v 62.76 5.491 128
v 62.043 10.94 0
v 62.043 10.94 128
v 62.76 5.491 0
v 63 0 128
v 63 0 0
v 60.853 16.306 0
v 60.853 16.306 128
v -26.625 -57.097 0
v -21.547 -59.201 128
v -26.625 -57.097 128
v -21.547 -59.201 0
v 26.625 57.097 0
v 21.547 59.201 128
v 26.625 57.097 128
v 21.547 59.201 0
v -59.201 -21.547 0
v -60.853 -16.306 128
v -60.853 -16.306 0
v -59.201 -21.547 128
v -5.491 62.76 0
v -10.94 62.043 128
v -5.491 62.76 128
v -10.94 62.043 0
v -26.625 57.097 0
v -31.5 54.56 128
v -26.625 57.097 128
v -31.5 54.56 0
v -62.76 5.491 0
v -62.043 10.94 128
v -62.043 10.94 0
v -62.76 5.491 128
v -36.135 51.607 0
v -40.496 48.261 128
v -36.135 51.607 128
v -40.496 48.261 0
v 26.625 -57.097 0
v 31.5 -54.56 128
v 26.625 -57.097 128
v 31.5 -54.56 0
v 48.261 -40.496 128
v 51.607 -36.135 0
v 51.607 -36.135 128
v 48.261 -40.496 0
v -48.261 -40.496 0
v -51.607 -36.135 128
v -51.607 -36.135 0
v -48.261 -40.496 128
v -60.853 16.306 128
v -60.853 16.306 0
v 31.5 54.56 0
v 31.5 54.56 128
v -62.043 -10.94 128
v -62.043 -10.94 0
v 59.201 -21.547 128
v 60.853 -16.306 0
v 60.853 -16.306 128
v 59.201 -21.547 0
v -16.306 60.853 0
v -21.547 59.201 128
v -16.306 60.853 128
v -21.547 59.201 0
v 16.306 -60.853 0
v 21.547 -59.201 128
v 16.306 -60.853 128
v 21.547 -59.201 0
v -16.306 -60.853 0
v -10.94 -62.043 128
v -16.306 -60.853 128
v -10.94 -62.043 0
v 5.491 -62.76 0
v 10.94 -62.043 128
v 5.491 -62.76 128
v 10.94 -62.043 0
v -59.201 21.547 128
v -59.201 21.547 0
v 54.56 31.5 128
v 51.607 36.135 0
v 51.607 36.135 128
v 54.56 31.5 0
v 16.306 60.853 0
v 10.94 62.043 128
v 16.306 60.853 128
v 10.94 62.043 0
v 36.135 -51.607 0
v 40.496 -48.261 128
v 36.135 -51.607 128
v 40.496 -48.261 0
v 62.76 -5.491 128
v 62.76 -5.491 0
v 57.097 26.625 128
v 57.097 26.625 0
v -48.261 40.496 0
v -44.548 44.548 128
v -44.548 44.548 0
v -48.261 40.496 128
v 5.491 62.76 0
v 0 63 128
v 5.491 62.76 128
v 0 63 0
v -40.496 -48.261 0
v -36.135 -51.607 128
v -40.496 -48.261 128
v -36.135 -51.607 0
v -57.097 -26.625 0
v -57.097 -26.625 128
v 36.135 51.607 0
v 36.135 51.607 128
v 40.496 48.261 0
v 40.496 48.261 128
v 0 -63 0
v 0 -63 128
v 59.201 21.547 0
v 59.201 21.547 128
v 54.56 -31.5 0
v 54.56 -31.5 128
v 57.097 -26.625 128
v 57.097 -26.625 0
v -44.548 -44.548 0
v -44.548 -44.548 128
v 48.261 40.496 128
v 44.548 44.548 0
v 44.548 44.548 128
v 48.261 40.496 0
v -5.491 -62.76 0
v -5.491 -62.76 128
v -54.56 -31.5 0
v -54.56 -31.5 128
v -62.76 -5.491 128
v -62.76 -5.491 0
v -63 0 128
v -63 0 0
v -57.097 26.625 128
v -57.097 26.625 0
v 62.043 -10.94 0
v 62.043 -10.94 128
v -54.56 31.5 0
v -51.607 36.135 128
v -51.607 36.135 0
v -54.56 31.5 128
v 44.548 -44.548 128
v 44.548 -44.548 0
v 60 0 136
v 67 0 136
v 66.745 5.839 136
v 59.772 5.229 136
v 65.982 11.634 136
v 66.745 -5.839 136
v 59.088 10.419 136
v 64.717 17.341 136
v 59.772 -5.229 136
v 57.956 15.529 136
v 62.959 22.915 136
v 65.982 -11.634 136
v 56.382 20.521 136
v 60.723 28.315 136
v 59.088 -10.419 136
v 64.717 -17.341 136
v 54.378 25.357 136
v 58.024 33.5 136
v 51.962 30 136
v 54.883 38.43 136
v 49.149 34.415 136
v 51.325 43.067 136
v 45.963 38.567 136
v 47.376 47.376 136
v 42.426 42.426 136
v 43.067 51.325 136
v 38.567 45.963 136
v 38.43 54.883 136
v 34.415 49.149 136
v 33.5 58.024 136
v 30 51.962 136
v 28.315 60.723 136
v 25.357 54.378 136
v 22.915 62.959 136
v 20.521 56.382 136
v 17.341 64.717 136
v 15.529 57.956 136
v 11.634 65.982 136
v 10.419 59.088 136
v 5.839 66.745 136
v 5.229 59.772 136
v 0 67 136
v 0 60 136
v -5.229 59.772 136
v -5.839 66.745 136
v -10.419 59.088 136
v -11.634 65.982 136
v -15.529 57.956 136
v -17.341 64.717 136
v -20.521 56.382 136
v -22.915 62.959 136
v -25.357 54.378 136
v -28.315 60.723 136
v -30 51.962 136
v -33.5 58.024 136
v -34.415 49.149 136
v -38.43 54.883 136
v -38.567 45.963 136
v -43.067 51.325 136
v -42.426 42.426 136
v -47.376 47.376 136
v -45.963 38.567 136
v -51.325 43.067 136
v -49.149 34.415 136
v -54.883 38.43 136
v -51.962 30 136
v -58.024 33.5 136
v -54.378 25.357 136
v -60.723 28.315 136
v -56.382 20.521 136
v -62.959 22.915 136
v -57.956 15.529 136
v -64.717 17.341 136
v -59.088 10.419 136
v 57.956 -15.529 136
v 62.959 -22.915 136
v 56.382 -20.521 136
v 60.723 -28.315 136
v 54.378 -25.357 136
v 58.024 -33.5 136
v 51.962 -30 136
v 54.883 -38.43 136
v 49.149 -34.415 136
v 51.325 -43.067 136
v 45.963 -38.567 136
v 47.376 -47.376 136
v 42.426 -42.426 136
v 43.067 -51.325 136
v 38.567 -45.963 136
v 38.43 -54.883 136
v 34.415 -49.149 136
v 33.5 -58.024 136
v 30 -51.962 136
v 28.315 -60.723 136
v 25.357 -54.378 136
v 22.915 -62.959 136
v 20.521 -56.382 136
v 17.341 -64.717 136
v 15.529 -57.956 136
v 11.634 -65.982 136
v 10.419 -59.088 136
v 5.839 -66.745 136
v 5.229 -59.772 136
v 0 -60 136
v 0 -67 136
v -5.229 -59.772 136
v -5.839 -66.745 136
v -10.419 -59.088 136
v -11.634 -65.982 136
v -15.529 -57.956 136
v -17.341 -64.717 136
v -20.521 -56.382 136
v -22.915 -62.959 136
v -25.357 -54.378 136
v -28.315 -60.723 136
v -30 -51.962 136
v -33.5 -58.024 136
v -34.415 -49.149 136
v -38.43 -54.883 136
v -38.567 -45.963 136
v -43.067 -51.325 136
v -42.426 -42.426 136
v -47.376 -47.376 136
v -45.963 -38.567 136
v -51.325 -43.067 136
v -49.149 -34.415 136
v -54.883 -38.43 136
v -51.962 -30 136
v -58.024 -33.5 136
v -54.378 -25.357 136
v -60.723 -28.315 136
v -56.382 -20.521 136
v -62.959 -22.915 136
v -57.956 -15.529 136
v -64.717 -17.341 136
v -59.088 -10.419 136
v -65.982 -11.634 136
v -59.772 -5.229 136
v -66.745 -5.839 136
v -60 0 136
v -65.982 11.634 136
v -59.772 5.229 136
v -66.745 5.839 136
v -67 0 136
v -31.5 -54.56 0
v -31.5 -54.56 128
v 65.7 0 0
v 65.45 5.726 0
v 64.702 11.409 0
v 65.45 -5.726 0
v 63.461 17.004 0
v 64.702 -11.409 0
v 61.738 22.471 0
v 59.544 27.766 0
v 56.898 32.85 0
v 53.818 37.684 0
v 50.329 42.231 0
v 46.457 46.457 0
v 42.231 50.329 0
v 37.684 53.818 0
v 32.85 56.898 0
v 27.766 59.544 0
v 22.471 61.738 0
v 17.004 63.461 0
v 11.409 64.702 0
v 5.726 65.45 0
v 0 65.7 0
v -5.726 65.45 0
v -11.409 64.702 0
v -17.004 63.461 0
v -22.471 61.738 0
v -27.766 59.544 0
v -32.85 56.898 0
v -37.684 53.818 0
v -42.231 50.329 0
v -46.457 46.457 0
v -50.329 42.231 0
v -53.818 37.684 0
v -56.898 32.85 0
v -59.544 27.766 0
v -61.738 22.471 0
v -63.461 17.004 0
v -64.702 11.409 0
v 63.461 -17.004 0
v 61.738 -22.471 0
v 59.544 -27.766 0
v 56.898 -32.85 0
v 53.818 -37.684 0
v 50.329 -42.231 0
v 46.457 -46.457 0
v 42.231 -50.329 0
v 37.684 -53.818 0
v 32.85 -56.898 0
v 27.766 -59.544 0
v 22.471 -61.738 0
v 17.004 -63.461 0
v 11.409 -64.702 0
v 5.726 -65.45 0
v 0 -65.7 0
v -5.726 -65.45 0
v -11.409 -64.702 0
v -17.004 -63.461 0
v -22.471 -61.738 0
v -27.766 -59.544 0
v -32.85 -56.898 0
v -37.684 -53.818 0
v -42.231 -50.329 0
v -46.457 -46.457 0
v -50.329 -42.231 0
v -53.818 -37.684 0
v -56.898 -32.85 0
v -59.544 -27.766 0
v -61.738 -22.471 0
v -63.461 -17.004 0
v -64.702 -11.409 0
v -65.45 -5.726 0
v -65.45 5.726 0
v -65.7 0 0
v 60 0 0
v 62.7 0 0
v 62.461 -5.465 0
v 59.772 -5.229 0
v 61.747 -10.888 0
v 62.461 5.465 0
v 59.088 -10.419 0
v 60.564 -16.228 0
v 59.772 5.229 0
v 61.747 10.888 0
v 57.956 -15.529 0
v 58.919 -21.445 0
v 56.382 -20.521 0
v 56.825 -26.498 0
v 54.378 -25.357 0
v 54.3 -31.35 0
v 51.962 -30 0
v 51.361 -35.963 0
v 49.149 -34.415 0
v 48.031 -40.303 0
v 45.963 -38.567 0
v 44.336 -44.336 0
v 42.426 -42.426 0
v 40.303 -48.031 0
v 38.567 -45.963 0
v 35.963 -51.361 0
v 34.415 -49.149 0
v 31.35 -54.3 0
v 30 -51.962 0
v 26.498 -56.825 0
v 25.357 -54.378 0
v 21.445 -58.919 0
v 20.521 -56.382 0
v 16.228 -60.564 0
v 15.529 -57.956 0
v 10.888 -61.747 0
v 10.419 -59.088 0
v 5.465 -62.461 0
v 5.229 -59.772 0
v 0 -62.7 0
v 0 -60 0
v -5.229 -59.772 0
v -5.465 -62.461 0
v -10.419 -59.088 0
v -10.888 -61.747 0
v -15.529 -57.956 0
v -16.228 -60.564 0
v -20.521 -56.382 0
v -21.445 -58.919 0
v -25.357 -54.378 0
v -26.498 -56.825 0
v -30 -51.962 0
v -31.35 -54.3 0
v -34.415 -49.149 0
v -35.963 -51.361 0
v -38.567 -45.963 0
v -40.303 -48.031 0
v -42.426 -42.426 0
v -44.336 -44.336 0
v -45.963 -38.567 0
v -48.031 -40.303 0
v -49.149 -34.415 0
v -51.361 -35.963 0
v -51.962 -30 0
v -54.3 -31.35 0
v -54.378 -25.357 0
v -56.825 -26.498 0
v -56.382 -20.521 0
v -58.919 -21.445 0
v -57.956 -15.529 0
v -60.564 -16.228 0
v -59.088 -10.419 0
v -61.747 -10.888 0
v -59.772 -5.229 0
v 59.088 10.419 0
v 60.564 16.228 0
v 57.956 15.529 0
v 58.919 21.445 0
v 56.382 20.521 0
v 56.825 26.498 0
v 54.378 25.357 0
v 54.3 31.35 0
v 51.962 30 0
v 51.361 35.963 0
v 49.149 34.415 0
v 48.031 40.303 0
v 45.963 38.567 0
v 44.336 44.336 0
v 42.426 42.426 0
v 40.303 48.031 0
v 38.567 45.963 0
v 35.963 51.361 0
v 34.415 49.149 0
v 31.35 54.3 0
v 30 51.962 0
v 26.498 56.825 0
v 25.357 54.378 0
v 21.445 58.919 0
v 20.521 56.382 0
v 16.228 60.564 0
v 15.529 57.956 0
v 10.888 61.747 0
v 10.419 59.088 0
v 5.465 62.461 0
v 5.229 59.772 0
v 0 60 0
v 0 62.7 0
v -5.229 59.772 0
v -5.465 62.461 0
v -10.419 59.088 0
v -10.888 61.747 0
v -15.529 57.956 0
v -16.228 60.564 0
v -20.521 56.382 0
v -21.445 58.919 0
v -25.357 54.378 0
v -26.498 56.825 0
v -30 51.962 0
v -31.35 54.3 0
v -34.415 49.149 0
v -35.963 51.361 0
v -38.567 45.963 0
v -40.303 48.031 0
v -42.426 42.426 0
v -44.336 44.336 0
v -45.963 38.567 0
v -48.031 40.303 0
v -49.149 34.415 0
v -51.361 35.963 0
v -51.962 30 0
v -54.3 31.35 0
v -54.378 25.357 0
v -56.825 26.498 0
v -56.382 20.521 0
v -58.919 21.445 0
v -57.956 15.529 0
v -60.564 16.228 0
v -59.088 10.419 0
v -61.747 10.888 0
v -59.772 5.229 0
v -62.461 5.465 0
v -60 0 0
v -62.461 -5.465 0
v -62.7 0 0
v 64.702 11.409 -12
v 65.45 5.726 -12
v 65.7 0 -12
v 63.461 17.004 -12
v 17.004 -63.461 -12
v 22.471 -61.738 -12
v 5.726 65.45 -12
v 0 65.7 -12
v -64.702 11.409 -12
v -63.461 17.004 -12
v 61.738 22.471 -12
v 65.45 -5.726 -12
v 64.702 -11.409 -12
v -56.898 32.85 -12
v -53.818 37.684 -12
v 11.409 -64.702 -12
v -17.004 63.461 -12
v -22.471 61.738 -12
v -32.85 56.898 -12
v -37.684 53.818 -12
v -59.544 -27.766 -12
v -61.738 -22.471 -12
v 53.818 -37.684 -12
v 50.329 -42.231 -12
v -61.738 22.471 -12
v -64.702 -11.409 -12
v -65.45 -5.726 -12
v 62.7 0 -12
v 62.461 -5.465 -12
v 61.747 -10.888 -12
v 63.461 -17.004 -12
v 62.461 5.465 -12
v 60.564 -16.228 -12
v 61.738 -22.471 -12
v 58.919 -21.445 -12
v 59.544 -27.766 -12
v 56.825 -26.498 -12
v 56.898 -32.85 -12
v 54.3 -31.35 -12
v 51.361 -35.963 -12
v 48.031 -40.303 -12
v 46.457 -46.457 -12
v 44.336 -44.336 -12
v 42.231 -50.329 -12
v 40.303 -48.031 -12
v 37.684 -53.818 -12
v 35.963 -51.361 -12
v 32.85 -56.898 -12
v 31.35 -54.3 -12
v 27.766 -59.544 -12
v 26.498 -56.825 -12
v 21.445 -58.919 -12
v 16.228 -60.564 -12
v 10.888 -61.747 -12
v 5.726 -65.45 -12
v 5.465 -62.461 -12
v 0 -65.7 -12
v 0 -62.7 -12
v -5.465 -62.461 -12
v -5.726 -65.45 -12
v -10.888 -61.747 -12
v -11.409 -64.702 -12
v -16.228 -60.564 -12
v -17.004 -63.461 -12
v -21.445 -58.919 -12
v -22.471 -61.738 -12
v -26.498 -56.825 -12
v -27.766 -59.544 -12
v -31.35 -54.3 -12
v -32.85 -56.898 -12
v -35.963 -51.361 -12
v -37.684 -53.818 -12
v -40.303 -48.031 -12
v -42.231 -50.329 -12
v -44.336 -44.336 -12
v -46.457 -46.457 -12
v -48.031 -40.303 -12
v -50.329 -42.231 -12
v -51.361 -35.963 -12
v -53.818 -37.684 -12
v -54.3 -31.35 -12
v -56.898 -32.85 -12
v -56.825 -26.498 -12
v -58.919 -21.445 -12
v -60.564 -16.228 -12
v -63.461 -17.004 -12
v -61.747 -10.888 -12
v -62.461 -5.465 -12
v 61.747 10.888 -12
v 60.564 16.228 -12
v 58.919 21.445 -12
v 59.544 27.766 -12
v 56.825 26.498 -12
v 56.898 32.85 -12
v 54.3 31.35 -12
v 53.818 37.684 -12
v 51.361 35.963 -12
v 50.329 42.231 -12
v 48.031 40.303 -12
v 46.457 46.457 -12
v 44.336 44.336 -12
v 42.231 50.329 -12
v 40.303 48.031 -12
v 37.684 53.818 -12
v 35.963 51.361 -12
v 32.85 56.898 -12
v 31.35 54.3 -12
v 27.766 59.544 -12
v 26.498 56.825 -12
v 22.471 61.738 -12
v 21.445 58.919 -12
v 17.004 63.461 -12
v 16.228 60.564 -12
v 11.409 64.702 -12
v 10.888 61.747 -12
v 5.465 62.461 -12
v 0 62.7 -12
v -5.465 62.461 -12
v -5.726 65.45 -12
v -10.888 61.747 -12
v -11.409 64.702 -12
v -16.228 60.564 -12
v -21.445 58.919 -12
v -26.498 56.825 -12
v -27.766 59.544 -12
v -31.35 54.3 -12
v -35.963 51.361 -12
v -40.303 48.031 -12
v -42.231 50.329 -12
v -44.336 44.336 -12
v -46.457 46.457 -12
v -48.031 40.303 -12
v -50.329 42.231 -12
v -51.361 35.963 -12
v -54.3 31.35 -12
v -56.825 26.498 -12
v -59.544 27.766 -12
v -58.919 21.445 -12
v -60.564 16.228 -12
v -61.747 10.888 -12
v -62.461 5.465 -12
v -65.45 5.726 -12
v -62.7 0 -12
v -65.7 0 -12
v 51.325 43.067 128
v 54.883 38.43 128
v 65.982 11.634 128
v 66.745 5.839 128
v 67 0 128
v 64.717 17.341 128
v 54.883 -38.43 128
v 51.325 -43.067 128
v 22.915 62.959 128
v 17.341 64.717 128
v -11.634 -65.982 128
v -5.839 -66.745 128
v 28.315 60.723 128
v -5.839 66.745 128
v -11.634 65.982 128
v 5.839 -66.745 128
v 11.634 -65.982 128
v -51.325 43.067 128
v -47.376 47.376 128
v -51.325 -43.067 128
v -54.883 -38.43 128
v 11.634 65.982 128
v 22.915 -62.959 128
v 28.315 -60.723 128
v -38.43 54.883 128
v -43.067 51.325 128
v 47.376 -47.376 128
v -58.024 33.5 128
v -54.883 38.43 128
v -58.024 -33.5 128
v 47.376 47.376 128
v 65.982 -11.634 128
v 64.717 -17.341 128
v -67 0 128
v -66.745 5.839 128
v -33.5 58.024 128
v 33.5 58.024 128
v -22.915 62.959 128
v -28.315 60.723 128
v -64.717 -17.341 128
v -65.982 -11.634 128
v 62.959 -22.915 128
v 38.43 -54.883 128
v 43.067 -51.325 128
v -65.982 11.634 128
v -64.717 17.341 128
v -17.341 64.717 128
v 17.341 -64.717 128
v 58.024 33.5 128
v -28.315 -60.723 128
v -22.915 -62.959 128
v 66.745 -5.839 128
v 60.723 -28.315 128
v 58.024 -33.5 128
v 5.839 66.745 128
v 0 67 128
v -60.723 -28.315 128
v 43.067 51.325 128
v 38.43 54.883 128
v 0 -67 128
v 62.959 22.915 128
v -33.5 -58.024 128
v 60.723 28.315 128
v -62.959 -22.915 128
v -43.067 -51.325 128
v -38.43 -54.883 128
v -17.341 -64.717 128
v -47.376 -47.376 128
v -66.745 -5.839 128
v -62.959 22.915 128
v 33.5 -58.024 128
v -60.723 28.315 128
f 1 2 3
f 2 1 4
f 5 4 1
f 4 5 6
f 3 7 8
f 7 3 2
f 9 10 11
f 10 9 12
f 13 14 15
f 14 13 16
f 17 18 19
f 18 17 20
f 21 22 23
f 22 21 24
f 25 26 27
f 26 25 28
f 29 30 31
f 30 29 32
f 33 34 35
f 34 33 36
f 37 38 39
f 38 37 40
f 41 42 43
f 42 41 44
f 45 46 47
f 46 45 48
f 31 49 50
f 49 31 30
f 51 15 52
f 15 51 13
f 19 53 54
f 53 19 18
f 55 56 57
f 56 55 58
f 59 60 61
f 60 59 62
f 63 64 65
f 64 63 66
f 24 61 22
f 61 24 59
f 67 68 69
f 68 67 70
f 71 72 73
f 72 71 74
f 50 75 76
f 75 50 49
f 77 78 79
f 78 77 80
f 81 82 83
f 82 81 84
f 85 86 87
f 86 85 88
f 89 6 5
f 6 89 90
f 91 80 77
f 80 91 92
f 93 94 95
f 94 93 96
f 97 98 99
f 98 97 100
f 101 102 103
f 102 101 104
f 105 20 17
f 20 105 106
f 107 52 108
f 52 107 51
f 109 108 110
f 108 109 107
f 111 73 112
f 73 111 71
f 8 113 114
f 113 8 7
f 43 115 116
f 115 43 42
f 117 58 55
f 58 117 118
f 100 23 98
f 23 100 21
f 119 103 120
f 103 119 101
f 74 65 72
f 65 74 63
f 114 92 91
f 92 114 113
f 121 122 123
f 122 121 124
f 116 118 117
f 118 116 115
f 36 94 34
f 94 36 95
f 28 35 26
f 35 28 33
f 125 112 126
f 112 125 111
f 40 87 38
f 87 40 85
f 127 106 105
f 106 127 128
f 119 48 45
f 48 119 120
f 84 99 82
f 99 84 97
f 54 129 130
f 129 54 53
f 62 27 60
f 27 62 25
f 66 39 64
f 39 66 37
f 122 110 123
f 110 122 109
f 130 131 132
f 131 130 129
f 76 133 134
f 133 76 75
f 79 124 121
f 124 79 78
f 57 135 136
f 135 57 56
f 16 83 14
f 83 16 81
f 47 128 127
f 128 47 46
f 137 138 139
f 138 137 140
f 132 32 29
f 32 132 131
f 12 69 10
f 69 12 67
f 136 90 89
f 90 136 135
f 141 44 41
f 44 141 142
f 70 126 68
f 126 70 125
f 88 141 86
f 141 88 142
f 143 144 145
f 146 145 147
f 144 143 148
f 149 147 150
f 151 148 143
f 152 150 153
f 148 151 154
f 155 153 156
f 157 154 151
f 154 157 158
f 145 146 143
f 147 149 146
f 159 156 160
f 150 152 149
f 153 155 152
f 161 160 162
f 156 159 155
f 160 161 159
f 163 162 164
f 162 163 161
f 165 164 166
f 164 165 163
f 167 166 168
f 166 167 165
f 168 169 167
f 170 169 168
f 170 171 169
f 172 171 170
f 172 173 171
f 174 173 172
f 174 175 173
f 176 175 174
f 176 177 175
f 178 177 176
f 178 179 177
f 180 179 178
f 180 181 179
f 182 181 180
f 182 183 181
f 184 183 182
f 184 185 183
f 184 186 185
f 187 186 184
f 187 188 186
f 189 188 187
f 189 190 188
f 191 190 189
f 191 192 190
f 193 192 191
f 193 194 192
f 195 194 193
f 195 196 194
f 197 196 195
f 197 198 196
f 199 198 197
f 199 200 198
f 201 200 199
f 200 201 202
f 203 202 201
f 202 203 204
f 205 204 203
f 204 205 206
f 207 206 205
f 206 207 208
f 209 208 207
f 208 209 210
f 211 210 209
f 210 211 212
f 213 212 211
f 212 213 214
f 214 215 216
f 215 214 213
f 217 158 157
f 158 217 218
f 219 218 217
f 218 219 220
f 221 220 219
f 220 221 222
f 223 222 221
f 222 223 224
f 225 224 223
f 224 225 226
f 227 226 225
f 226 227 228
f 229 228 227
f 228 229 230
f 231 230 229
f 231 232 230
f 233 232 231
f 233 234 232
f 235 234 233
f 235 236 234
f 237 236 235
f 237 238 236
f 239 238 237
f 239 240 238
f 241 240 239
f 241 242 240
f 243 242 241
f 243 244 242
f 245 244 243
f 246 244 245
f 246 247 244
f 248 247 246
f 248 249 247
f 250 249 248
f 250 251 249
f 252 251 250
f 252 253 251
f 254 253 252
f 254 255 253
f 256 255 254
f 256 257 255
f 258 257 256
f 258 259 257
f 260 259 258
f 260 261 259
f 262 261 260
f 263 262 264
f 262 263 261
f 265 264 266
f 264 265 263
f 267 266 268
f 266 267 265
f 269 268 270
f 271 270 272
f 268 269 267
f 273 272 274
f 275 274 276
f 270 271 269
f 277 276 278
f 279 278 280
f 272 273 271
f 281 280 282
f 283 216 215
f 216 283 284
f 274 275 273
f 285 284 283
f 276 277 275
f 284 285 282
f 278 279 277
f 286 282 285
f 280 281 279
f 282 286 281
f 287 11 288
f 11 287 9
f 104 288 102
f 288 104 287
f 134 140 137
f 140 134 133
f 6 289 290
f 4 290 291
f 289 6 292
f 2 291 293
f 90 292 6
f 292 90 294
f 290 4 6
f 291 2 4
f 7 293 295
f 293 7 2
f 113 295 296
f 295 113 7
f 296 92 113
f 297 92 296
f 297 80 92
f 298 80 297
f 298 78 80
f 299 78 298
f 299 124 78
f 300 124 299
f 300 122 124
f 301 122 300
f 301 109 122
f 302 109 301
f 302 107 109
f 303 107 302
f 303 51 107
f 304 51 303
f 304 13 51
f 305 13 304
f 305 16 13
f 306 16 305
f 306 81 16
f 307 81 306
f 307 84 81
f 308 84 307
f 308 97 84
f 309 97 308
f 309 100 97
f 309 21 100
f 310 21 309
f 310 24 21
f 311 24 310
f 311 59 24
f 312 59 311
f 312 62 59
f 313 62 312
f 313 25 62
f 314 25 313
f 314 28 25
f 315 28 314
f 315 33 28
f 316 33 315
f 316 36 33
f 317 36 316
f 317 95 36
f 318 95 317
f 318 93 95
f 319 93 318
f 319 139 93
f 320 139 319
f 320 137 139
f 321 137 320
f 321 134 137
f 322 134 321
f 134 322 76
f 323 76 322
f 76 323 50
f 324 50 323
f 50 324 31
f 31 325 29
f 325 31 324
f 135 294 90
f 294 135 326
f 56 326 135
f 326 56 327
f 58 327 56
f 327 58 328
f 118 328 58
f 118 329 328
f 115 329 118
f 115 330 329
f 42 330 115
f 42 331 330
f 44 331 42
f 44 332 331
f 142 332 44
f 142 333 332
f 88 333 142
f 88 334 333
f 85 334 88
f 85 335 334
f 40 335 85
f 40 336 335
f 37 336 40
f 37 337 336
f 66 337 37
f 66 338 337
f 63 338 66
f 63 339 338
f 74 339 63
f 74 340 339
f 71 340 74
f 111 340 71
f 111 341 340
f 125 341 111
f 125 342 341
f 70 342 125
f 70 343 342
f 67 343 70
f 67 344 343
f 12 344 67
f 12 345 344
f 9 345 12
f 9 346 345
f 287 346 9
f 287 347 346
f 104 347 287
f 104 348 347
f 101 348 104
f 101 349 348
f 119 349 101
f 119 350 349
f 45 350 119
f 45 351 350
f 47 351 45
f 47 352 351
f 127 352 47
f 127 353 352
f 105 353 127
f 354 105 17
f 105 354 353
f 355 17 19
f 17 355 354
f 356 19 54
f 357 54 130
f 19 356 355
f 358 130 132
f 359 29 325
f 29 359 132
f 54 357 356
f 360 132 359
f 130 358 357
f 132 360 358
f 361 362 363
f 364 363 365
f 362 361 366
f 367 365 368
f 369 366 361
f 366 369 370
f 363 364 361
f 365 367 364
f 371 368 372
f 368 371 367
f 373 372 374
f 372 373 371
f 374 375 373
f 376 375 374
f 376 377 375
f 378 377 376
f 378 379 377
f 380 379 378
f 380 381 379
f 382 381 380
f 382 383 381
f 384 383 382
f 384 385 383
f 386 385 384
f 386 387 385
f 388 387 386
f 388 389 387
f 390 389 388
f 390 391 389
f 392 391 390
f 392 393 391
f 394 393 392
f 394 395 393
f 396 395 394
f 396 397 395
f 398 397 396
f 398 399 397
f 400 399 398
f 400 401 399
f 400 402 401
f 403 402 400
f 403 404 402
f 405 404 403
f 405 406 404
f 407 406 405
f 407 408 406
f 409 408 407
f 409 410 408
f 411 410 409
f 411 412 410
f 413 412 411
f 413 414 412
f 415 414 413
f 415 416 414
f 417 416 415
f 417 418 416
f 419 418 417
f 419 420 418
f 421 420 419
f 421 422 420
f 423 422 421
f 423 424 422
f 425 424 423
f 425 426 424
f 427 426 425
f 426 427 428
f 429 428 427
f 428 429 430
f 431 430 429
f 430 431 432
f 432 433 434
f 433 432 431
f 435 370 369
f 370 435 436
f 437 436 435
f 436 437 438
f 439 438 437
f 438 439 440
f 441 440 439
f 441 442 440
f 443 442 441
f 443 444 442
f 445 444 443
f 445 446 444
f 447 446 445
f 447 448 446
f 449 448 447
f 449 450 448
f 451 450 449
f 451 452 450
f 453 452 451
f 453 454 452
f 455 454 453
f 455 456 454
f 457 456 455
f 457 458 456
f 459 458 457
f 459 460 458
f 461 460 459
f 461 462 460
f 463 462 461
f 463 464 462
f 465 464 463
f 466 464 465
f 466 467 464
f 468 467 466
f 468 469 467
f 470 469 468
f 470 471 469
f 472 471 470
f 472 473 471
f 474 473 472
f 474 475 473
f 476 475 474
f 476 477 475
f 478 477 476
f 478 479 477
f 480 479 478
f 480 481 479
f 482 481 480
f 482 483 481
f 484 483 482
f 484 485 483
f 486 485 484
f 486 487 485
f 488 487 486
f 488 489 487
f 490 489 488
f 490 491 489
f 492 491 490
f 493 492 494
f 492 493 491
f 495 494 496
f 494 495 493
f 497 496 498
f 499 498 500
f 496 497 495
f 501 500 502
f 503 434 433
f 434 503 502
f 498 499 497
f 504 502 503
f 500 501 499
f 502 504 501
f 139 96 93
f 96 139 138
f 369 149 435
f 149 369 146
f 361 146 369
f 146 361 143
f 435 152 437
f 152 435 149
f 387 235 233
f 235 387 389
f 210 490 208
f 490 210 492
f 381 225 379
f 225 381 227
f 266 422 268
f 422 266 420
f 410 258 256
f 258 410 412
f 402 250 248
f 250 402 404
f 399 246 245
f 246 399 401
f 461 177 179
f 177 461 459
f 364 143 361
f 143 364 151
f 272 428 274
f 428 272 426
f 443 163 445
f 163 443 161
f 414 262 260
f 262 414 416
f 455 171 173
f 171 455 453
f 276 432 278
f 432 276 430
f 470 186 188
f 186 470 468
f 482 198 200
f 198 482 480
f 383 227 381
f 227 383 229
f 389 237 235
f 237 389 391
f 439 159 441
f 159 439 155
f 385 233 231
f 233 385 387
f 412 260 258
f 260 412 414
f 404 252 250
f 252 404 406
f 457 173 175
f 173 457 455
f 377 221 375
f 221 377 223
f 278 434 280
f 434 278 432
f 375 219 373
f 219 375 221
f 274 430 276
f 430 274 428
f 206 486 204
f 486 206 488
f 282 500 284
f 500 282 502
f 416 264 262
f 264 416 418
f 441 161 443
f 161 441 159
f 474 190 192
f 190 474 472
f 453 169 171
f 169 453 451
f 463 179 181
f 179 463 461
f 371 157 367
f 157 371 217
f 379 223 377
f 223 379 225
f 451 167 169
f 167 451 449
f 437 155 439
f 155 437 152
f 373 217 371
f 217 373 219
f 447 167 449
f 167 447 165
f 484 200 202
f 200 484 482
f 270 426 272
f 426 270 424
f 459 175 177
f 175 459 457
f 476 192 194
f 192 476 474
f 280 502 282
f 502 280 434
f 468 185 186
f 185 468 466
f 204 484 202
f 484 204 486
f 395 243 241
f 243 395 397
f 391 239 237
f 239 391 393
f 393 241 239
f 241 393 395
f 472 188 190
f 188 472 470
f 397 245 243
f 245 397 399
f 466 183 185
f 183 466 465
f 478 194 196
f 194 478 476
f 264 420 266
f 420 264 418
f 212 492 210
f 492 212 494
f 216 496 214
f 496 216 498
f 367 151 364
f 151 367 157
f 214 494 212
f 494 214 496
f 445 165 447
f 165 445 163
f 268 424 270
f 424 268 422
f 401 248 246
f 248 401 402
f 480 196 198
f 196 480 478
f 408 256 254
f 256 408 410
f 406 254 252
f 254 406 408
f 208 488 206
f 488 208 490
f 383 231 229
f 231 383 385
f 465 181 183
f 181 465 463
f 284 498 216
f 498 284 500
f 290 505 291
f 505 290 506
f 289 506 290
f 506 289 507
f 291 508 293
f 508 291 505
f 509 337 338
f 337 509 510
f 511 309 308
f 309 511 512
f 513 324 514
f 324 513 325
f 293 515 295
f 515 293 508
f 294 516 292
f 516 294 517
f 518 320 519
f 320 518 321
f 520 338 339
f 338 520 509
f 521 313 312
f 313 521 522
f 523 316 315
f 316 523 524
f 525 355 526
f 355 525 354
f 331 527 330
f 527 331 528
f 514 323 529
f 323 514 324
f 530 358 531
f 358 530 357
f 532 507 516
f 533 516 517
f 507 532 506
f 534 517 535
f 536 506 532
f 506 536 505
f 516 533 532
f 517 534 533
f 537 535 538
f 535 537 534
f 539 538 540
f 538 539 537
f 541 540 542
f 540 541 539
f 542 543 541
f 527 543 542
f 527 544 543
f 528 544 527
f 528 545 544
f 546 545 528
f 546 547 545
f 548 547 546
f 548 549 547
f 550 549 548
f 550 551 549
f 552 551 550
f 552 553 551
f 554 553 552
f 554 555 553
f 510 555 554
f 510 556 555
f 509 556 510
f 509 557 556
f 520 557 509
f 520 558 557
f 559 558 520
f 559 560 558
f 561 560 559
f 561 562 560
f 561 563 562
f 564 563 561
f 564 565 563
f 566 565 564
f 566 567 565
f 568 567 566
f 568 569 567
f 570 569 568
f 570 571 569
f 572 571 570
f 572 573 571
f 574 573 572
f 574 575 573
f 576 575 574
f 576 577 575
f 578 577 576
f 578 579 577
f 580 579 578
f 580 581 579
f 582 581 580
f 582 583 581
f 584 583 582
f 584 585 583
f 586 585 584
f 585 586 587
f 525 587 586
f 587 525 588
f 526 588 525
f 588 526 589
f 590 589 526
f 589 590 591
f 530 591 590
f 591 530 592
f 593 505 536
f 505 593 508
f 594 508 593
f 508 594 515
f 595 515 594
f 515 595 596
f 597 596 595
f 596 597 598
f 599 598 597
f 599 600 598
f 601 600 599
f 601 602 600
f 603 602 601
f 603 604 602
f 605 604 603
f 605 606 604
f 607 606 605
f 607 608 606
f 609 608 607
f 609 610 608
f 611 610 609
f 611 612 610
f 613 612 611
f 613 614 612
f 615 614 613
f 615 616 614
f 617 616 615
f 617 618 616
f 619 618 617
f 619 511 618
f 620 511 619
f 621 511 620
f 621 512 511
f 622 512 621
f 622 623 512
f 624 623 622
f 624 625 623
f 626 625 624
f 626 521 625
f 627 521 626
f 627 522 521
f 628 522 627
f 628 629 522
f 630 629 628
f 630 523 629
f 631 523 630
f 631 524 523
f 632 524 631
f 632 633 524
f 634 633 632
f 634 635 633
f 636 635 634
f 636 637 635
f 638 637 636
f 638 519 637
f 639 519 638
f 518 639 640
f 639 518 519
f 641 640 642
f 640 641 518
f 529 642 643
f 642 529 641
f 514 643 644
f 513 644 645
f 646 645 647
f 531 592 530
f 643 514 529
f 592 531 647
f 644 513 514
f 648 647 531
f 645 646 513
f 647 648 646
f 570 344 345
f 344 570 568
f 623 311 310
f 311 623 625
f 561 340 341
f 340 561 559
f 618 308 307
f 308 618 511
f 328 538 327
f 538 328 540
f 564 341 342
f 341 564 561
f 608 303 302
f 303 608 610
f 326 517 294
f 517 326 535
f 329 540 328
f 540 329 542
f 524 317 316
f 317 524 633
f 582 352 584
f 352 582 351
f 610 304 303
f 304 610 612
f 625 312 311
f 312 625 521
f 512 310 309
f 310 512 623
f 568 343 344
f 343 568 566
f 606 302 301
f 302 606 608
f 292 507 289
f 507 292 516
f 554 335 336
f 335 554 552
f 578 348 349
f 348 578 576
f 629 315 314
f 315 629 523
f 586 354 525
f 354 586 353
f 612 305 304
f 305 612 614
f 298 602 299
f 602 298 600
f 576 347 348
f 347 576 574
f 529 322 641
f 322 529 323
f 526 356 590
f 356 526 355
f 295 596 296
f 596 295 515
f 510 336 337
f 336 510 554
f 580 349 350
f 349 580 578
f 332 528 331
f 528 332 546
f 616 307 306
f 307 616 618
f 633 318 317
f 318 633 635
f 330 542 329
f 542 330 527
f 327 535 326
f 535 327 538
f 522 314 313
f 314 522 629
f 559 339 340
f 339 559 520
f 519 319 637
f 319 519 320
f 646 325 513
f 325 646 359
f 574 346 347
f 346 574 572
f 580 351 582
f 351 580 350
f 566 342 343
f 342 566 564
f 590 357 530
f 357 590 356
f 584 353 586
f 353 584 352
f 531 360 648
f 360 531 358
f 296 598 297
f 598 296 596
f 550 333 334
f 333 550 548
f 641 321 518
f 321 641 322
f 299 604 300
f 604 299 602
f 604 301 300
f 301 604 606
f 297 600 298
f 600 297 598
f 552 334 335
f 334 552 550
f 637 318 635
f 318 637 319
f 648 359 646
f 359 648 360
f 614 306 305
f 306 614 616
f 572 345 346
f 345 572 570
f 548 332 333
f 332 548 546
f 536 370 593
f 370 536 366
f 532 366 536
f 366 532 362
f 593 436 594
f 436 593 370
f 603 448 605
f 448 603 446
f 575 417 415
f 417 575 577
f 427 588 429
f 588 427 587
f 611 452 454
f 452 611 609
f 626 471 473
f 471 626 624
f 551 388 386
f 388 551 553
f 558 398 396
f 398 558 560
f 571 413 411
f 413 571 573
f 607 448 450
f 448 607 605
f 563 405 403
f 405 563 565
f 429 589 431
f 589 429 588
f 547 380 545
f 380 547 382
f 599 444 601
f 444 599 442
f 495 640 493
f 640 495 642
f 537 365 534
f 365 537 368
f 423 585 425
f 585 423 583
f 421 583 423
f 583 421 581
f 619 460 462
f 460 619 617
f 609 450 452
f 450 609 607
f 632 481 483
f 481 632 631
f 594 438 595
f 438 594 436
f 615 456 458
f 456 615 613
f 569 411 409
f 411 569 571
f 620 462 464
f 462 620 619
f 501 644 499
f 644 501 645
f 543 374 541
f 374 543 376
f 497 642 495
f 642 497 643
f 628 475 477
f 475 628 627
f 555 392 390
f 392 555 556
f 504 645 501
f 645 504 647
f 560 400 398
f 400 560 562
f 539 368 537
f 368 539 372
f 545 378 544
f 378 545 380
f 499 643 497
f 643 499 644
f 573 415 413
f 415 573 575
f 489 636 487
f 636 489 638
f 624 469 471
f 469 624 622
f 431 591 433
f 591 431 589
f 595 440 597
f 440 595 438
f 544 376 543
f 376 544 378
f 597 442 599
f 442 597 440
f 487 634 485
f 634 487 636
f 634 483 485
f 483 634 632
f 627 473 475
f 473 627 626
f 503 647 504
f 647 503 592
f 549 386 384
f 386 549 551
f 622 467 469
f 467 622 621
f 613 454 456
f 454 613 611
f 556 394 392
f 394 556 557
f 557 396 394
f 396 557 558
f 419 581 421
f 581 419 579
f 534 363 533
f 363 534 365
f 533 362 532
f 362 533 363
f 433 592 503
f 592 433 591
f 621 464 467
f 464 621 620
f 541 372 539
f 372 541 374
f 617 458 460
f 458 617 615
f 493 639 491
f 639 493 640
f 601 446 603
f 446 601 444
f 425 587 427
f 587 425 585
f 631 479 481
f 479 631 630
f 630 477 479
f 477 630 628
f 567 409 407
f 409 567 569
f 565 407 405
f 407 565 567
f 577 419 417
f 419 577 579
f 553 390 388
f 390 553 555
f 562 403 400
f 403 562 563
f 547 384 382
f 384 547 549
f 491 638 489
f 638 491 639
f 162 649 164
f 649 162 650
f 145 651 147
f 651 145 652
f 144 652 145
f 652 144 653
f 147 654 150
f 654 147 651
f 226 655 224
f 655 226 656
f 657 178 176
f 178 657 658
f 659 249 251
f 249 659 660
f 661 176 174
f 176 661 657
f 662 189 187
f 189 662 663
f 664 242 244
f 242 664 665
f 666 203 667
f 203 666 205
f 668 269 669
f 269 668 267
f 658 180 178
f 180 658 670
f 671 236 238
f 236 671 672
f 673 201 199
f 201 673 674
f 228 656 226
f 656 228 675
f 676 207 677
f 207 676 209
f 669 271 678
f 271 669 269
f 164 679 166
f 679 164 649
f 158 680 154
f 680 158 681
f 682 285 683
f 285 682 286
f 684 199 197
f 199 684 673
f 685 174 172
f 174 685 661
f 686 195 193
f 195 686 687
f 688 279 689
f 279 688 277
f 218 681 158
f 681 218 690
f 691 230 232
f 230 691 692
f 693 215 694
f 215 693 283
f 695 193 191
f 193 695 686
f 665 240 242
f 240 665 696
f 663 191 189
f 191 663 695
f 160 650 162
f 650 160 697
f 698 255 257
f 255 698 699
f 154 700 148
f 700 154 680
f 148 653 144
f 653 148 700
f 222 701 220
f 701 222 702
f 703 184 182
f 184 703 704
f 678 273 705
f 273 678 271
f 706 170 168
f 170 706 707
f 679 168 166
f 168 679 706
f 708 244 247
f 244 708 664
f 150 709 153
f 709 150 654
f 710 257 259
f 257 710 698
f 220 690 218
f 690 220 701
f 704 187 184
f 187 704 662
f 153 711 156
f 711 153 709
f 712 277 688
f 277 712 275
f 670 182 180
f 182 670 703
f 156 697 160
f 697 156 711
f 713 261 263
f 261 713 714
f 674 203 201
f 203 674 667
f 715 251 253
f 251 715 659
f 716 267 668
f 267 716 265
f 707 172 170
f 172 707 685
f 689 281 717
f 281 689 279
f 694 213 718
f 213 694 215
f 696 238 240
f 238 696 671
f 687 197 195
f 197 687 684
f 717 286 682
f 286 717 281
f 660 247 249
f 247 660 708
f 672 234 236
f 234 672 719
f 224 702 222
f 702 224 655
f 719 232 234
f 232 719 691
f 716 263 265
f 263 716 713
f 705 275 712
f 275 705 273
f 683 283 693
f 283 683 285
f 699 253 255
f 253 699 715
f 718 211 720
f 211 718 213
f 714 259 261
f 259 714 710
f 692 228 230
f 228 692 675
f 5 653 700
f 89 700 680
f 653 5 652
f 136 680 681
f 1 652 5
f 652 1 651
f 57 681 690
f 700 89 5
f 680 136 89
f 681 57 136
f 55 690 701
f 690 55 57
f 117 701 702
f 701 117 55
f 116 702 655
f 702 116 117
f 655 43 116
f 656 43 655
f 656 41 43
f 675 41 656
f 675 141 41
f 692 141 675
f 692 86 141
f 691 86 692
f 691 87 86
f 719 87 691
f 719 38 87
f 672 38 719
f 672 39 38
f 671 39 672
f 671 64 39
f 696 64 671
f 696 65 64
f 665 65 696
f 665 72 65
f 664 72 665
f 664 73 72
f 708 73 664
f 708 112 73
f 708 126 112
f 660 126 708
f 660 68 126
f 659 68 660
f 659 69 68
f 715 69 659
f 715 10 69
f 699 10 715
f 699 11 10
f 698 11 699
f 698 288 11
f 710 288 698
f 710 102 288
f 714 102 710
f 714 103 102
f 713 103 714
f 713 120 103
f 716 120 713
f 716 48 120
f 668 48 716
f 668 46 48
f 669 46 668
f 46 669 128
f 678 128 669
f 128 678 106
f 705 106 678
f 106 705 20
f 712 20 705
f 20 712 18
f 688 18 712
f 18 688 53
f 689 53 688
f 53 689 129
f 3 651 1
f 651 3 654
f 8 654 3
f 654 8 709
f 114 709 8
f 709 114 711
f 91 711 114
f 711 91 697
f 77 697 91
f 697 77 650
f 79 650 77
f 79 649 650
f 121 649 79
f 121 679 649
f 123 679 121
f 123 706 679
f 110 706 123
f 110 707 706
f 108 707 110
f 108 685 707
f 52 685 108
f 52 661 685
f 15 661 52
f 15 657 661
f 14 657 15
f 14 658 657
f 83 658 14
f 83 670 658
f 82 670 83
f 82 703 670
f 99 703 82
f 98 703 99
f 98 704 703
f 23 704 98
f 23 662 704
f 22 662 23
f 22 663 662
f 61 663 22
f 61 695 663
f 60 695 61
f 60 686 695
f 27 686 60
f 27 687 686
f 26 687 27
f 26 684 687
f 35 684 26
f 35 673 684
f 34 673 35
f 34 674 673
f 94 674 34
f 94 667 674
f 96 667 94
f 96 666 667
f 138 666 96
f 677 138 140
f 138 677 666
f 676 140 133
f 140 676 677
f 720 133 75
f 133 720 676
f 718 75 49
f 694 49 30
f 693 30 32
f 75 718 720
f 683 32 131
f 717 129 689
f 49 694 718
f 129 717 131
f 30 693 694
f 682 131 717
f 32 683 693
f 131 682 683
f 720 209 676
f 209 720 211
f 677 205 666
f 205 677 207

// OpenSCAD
// s_edf_120_thrust_tube.scad
// Thrust tube for Serenity Rev N 120mm rear EDF.
//
// Remixed from Thingiverse thing:2838324 (120mm fuselage EDF).
// This tube channels exhaust from the EDF exit face through the
// aft fuselage (station ~440mm) to the rear iris nozzle (station ~600mm).
//
// Coordinate system: +Z = aft (exhaust direction).
// Z=0 = forward face of thrust tube (mates to EDF casing aft lip / motor mount ring).
// Z=TUBE_L = aft bonding face (mates to rear_nozzle_frame.stl base ring).
//
// Integration interfaces:
//   Forward (Z=0):     forward spigot ID = EDF casing OD; locates tube on EDF exit.
//   Aft (Z=TUBE_L):    bonding flange ring bonds to rear_nozzle_frame.stl base.
//
// Station reference (world X coordinates of s_rear_shell24_2mm_repaired.stl):
//   EDF exhaust face at X ≈ -90 mm (in cargo section, per plenum design).
//   Nozzle frame shoulder at X = -226 mm (= aft face -246 + seat depth 20).
//   Required span: 226 - 90 = 136 mm → TUBE_L = 136 mm.
//
//   Rev B (2026-06-02): corrected TUBE_L from 155 mm to 136 mm.
//   Previous value was 19 mm too long; tube end overshot the nozzle shoulder.
//
// Print: PETG, 0.20mm layers, 20% gyroid infill.
// Note: orient with tube axis vertical on printer for best layer adhesion.
// No support required if printed tube-axis vertical.

// ── Geometry parameters ────────────────────────────────────────────────────

BORE_ID      = 120;   // [mm] internal bore (matches EDF fan bore)
WALL         =   3;   // [mm] tube wall thickness → OD = BORE_ID + 2×WALL
TUBE_L       = 136;   // [mm] total tube length (EDF exhaust X≈-90 to nozzle shoulder X=-226)

// Forward spigot: thin sleeve that slips over the EDF casing aft OD
// The EDF casing outer diameter is nominally ~125mm (varies by brand);
// adjust SPIGOT_ID if your 120mm EDF casing OD differs.
EDF_CASING_OD = 125;  // [mm] EDF casing outer diameter — adjust to match actual unit
SPIGOT_ID     = EDF_CASING_OD + 0.4; // slip-fit clearance
SPIGOT_WALL   =   3;  // [mm] spigot sleeve wall
SPIGOT_L      =  12;  // [mm] spigot engagement length (overlaps EDF casing)

// Aft bonding flange: widens to grip against rear_nozzle_frame.stl base ring.
// rear_nozzle_frame base ring inner bore is assumed ~128mm — verify in slicer.
FLANGE_OD     = 134;  // [mm] bonding flange outer diameter
FLANGE_L      =   8;  // [mm] axial depth of bonding flange

// Lightening slots in tube wall (optional aero/mass reduction — set to 0 to disable)
SLOT_COUNT    =   0;  // number of axial slots in tube wall (0 = solid tube)
SLOT_W        =   8;  // [mm] slot width
SLOT_L        = 100;  // [mm] slot length (centred on tube)

$fn = 72;

// ── Derived values ─────────────────────────────────────────────────────────

TUBE_OD = BORE_ID + 2 * WALL;          // = 126mm
SPIGOT_OD = SPIGOT_ID + 2 * SPIGOT_WALL;

// ── Modules ────────────────────────────────────────────────────────────────

module main_tube() {
    difference() {
        cylinder(h = TUBE_L, r = TUBE_OD / 2);
        // bore
        translate([0, 0, -0.5])
            cylinder(h = TUBE_L + 1, r = BORE_ID / 2);
        // axial lightening slots
        if (SLOT_COUNT > 0)
            for (i = [0 : SLOT_COUNT - 1])
                rotate([0, 0, i * 360 / SLOT_COUNT])
                translate([TUBE_OD / 2 - WALL / 2, 0, TUBE_L / 2])
                    cube([WALL + 1, SLOT_W, SLOT_L], center = true);
    }
}

module forward_spigot() {
    // sleeve at Z=0 end that overlaps EDF casing aft lip
    difference() {
        cylinder(h = SPIGOT_L, r = SPIGOT_OD / 2);
        // inner bore clears EDF casing
        translate([0, 0, -0.5])
            cylinder(h = SPIGOT_L + 1, r = SPIGOT_ID / 2);
    }
}

module aft_bonding_flange() {
    // thickened ring at aft end for epoxy bond to rear_nozzle_frame base ring
    translate([0, 0, TUBE_L - FLANGE_L])
    difference() {
        cylinder(h = FLANGE_L, r = FLANGE_OD / 2);
        translate([0, 0, -0.5])
            cylinder(h = FLANGE_L + 1, r = BORE_ID / 2);
    }
}

// ── Assembly ───────────────────────────────────────────────────────────────

union() {
    main_tube();
    // forward spigot protrudes in the −Z direction (over EDF casing)
    translate([0, 0, -SPIGOT_L])
        forward_spigot();
    aft_bonding_flange();
}
